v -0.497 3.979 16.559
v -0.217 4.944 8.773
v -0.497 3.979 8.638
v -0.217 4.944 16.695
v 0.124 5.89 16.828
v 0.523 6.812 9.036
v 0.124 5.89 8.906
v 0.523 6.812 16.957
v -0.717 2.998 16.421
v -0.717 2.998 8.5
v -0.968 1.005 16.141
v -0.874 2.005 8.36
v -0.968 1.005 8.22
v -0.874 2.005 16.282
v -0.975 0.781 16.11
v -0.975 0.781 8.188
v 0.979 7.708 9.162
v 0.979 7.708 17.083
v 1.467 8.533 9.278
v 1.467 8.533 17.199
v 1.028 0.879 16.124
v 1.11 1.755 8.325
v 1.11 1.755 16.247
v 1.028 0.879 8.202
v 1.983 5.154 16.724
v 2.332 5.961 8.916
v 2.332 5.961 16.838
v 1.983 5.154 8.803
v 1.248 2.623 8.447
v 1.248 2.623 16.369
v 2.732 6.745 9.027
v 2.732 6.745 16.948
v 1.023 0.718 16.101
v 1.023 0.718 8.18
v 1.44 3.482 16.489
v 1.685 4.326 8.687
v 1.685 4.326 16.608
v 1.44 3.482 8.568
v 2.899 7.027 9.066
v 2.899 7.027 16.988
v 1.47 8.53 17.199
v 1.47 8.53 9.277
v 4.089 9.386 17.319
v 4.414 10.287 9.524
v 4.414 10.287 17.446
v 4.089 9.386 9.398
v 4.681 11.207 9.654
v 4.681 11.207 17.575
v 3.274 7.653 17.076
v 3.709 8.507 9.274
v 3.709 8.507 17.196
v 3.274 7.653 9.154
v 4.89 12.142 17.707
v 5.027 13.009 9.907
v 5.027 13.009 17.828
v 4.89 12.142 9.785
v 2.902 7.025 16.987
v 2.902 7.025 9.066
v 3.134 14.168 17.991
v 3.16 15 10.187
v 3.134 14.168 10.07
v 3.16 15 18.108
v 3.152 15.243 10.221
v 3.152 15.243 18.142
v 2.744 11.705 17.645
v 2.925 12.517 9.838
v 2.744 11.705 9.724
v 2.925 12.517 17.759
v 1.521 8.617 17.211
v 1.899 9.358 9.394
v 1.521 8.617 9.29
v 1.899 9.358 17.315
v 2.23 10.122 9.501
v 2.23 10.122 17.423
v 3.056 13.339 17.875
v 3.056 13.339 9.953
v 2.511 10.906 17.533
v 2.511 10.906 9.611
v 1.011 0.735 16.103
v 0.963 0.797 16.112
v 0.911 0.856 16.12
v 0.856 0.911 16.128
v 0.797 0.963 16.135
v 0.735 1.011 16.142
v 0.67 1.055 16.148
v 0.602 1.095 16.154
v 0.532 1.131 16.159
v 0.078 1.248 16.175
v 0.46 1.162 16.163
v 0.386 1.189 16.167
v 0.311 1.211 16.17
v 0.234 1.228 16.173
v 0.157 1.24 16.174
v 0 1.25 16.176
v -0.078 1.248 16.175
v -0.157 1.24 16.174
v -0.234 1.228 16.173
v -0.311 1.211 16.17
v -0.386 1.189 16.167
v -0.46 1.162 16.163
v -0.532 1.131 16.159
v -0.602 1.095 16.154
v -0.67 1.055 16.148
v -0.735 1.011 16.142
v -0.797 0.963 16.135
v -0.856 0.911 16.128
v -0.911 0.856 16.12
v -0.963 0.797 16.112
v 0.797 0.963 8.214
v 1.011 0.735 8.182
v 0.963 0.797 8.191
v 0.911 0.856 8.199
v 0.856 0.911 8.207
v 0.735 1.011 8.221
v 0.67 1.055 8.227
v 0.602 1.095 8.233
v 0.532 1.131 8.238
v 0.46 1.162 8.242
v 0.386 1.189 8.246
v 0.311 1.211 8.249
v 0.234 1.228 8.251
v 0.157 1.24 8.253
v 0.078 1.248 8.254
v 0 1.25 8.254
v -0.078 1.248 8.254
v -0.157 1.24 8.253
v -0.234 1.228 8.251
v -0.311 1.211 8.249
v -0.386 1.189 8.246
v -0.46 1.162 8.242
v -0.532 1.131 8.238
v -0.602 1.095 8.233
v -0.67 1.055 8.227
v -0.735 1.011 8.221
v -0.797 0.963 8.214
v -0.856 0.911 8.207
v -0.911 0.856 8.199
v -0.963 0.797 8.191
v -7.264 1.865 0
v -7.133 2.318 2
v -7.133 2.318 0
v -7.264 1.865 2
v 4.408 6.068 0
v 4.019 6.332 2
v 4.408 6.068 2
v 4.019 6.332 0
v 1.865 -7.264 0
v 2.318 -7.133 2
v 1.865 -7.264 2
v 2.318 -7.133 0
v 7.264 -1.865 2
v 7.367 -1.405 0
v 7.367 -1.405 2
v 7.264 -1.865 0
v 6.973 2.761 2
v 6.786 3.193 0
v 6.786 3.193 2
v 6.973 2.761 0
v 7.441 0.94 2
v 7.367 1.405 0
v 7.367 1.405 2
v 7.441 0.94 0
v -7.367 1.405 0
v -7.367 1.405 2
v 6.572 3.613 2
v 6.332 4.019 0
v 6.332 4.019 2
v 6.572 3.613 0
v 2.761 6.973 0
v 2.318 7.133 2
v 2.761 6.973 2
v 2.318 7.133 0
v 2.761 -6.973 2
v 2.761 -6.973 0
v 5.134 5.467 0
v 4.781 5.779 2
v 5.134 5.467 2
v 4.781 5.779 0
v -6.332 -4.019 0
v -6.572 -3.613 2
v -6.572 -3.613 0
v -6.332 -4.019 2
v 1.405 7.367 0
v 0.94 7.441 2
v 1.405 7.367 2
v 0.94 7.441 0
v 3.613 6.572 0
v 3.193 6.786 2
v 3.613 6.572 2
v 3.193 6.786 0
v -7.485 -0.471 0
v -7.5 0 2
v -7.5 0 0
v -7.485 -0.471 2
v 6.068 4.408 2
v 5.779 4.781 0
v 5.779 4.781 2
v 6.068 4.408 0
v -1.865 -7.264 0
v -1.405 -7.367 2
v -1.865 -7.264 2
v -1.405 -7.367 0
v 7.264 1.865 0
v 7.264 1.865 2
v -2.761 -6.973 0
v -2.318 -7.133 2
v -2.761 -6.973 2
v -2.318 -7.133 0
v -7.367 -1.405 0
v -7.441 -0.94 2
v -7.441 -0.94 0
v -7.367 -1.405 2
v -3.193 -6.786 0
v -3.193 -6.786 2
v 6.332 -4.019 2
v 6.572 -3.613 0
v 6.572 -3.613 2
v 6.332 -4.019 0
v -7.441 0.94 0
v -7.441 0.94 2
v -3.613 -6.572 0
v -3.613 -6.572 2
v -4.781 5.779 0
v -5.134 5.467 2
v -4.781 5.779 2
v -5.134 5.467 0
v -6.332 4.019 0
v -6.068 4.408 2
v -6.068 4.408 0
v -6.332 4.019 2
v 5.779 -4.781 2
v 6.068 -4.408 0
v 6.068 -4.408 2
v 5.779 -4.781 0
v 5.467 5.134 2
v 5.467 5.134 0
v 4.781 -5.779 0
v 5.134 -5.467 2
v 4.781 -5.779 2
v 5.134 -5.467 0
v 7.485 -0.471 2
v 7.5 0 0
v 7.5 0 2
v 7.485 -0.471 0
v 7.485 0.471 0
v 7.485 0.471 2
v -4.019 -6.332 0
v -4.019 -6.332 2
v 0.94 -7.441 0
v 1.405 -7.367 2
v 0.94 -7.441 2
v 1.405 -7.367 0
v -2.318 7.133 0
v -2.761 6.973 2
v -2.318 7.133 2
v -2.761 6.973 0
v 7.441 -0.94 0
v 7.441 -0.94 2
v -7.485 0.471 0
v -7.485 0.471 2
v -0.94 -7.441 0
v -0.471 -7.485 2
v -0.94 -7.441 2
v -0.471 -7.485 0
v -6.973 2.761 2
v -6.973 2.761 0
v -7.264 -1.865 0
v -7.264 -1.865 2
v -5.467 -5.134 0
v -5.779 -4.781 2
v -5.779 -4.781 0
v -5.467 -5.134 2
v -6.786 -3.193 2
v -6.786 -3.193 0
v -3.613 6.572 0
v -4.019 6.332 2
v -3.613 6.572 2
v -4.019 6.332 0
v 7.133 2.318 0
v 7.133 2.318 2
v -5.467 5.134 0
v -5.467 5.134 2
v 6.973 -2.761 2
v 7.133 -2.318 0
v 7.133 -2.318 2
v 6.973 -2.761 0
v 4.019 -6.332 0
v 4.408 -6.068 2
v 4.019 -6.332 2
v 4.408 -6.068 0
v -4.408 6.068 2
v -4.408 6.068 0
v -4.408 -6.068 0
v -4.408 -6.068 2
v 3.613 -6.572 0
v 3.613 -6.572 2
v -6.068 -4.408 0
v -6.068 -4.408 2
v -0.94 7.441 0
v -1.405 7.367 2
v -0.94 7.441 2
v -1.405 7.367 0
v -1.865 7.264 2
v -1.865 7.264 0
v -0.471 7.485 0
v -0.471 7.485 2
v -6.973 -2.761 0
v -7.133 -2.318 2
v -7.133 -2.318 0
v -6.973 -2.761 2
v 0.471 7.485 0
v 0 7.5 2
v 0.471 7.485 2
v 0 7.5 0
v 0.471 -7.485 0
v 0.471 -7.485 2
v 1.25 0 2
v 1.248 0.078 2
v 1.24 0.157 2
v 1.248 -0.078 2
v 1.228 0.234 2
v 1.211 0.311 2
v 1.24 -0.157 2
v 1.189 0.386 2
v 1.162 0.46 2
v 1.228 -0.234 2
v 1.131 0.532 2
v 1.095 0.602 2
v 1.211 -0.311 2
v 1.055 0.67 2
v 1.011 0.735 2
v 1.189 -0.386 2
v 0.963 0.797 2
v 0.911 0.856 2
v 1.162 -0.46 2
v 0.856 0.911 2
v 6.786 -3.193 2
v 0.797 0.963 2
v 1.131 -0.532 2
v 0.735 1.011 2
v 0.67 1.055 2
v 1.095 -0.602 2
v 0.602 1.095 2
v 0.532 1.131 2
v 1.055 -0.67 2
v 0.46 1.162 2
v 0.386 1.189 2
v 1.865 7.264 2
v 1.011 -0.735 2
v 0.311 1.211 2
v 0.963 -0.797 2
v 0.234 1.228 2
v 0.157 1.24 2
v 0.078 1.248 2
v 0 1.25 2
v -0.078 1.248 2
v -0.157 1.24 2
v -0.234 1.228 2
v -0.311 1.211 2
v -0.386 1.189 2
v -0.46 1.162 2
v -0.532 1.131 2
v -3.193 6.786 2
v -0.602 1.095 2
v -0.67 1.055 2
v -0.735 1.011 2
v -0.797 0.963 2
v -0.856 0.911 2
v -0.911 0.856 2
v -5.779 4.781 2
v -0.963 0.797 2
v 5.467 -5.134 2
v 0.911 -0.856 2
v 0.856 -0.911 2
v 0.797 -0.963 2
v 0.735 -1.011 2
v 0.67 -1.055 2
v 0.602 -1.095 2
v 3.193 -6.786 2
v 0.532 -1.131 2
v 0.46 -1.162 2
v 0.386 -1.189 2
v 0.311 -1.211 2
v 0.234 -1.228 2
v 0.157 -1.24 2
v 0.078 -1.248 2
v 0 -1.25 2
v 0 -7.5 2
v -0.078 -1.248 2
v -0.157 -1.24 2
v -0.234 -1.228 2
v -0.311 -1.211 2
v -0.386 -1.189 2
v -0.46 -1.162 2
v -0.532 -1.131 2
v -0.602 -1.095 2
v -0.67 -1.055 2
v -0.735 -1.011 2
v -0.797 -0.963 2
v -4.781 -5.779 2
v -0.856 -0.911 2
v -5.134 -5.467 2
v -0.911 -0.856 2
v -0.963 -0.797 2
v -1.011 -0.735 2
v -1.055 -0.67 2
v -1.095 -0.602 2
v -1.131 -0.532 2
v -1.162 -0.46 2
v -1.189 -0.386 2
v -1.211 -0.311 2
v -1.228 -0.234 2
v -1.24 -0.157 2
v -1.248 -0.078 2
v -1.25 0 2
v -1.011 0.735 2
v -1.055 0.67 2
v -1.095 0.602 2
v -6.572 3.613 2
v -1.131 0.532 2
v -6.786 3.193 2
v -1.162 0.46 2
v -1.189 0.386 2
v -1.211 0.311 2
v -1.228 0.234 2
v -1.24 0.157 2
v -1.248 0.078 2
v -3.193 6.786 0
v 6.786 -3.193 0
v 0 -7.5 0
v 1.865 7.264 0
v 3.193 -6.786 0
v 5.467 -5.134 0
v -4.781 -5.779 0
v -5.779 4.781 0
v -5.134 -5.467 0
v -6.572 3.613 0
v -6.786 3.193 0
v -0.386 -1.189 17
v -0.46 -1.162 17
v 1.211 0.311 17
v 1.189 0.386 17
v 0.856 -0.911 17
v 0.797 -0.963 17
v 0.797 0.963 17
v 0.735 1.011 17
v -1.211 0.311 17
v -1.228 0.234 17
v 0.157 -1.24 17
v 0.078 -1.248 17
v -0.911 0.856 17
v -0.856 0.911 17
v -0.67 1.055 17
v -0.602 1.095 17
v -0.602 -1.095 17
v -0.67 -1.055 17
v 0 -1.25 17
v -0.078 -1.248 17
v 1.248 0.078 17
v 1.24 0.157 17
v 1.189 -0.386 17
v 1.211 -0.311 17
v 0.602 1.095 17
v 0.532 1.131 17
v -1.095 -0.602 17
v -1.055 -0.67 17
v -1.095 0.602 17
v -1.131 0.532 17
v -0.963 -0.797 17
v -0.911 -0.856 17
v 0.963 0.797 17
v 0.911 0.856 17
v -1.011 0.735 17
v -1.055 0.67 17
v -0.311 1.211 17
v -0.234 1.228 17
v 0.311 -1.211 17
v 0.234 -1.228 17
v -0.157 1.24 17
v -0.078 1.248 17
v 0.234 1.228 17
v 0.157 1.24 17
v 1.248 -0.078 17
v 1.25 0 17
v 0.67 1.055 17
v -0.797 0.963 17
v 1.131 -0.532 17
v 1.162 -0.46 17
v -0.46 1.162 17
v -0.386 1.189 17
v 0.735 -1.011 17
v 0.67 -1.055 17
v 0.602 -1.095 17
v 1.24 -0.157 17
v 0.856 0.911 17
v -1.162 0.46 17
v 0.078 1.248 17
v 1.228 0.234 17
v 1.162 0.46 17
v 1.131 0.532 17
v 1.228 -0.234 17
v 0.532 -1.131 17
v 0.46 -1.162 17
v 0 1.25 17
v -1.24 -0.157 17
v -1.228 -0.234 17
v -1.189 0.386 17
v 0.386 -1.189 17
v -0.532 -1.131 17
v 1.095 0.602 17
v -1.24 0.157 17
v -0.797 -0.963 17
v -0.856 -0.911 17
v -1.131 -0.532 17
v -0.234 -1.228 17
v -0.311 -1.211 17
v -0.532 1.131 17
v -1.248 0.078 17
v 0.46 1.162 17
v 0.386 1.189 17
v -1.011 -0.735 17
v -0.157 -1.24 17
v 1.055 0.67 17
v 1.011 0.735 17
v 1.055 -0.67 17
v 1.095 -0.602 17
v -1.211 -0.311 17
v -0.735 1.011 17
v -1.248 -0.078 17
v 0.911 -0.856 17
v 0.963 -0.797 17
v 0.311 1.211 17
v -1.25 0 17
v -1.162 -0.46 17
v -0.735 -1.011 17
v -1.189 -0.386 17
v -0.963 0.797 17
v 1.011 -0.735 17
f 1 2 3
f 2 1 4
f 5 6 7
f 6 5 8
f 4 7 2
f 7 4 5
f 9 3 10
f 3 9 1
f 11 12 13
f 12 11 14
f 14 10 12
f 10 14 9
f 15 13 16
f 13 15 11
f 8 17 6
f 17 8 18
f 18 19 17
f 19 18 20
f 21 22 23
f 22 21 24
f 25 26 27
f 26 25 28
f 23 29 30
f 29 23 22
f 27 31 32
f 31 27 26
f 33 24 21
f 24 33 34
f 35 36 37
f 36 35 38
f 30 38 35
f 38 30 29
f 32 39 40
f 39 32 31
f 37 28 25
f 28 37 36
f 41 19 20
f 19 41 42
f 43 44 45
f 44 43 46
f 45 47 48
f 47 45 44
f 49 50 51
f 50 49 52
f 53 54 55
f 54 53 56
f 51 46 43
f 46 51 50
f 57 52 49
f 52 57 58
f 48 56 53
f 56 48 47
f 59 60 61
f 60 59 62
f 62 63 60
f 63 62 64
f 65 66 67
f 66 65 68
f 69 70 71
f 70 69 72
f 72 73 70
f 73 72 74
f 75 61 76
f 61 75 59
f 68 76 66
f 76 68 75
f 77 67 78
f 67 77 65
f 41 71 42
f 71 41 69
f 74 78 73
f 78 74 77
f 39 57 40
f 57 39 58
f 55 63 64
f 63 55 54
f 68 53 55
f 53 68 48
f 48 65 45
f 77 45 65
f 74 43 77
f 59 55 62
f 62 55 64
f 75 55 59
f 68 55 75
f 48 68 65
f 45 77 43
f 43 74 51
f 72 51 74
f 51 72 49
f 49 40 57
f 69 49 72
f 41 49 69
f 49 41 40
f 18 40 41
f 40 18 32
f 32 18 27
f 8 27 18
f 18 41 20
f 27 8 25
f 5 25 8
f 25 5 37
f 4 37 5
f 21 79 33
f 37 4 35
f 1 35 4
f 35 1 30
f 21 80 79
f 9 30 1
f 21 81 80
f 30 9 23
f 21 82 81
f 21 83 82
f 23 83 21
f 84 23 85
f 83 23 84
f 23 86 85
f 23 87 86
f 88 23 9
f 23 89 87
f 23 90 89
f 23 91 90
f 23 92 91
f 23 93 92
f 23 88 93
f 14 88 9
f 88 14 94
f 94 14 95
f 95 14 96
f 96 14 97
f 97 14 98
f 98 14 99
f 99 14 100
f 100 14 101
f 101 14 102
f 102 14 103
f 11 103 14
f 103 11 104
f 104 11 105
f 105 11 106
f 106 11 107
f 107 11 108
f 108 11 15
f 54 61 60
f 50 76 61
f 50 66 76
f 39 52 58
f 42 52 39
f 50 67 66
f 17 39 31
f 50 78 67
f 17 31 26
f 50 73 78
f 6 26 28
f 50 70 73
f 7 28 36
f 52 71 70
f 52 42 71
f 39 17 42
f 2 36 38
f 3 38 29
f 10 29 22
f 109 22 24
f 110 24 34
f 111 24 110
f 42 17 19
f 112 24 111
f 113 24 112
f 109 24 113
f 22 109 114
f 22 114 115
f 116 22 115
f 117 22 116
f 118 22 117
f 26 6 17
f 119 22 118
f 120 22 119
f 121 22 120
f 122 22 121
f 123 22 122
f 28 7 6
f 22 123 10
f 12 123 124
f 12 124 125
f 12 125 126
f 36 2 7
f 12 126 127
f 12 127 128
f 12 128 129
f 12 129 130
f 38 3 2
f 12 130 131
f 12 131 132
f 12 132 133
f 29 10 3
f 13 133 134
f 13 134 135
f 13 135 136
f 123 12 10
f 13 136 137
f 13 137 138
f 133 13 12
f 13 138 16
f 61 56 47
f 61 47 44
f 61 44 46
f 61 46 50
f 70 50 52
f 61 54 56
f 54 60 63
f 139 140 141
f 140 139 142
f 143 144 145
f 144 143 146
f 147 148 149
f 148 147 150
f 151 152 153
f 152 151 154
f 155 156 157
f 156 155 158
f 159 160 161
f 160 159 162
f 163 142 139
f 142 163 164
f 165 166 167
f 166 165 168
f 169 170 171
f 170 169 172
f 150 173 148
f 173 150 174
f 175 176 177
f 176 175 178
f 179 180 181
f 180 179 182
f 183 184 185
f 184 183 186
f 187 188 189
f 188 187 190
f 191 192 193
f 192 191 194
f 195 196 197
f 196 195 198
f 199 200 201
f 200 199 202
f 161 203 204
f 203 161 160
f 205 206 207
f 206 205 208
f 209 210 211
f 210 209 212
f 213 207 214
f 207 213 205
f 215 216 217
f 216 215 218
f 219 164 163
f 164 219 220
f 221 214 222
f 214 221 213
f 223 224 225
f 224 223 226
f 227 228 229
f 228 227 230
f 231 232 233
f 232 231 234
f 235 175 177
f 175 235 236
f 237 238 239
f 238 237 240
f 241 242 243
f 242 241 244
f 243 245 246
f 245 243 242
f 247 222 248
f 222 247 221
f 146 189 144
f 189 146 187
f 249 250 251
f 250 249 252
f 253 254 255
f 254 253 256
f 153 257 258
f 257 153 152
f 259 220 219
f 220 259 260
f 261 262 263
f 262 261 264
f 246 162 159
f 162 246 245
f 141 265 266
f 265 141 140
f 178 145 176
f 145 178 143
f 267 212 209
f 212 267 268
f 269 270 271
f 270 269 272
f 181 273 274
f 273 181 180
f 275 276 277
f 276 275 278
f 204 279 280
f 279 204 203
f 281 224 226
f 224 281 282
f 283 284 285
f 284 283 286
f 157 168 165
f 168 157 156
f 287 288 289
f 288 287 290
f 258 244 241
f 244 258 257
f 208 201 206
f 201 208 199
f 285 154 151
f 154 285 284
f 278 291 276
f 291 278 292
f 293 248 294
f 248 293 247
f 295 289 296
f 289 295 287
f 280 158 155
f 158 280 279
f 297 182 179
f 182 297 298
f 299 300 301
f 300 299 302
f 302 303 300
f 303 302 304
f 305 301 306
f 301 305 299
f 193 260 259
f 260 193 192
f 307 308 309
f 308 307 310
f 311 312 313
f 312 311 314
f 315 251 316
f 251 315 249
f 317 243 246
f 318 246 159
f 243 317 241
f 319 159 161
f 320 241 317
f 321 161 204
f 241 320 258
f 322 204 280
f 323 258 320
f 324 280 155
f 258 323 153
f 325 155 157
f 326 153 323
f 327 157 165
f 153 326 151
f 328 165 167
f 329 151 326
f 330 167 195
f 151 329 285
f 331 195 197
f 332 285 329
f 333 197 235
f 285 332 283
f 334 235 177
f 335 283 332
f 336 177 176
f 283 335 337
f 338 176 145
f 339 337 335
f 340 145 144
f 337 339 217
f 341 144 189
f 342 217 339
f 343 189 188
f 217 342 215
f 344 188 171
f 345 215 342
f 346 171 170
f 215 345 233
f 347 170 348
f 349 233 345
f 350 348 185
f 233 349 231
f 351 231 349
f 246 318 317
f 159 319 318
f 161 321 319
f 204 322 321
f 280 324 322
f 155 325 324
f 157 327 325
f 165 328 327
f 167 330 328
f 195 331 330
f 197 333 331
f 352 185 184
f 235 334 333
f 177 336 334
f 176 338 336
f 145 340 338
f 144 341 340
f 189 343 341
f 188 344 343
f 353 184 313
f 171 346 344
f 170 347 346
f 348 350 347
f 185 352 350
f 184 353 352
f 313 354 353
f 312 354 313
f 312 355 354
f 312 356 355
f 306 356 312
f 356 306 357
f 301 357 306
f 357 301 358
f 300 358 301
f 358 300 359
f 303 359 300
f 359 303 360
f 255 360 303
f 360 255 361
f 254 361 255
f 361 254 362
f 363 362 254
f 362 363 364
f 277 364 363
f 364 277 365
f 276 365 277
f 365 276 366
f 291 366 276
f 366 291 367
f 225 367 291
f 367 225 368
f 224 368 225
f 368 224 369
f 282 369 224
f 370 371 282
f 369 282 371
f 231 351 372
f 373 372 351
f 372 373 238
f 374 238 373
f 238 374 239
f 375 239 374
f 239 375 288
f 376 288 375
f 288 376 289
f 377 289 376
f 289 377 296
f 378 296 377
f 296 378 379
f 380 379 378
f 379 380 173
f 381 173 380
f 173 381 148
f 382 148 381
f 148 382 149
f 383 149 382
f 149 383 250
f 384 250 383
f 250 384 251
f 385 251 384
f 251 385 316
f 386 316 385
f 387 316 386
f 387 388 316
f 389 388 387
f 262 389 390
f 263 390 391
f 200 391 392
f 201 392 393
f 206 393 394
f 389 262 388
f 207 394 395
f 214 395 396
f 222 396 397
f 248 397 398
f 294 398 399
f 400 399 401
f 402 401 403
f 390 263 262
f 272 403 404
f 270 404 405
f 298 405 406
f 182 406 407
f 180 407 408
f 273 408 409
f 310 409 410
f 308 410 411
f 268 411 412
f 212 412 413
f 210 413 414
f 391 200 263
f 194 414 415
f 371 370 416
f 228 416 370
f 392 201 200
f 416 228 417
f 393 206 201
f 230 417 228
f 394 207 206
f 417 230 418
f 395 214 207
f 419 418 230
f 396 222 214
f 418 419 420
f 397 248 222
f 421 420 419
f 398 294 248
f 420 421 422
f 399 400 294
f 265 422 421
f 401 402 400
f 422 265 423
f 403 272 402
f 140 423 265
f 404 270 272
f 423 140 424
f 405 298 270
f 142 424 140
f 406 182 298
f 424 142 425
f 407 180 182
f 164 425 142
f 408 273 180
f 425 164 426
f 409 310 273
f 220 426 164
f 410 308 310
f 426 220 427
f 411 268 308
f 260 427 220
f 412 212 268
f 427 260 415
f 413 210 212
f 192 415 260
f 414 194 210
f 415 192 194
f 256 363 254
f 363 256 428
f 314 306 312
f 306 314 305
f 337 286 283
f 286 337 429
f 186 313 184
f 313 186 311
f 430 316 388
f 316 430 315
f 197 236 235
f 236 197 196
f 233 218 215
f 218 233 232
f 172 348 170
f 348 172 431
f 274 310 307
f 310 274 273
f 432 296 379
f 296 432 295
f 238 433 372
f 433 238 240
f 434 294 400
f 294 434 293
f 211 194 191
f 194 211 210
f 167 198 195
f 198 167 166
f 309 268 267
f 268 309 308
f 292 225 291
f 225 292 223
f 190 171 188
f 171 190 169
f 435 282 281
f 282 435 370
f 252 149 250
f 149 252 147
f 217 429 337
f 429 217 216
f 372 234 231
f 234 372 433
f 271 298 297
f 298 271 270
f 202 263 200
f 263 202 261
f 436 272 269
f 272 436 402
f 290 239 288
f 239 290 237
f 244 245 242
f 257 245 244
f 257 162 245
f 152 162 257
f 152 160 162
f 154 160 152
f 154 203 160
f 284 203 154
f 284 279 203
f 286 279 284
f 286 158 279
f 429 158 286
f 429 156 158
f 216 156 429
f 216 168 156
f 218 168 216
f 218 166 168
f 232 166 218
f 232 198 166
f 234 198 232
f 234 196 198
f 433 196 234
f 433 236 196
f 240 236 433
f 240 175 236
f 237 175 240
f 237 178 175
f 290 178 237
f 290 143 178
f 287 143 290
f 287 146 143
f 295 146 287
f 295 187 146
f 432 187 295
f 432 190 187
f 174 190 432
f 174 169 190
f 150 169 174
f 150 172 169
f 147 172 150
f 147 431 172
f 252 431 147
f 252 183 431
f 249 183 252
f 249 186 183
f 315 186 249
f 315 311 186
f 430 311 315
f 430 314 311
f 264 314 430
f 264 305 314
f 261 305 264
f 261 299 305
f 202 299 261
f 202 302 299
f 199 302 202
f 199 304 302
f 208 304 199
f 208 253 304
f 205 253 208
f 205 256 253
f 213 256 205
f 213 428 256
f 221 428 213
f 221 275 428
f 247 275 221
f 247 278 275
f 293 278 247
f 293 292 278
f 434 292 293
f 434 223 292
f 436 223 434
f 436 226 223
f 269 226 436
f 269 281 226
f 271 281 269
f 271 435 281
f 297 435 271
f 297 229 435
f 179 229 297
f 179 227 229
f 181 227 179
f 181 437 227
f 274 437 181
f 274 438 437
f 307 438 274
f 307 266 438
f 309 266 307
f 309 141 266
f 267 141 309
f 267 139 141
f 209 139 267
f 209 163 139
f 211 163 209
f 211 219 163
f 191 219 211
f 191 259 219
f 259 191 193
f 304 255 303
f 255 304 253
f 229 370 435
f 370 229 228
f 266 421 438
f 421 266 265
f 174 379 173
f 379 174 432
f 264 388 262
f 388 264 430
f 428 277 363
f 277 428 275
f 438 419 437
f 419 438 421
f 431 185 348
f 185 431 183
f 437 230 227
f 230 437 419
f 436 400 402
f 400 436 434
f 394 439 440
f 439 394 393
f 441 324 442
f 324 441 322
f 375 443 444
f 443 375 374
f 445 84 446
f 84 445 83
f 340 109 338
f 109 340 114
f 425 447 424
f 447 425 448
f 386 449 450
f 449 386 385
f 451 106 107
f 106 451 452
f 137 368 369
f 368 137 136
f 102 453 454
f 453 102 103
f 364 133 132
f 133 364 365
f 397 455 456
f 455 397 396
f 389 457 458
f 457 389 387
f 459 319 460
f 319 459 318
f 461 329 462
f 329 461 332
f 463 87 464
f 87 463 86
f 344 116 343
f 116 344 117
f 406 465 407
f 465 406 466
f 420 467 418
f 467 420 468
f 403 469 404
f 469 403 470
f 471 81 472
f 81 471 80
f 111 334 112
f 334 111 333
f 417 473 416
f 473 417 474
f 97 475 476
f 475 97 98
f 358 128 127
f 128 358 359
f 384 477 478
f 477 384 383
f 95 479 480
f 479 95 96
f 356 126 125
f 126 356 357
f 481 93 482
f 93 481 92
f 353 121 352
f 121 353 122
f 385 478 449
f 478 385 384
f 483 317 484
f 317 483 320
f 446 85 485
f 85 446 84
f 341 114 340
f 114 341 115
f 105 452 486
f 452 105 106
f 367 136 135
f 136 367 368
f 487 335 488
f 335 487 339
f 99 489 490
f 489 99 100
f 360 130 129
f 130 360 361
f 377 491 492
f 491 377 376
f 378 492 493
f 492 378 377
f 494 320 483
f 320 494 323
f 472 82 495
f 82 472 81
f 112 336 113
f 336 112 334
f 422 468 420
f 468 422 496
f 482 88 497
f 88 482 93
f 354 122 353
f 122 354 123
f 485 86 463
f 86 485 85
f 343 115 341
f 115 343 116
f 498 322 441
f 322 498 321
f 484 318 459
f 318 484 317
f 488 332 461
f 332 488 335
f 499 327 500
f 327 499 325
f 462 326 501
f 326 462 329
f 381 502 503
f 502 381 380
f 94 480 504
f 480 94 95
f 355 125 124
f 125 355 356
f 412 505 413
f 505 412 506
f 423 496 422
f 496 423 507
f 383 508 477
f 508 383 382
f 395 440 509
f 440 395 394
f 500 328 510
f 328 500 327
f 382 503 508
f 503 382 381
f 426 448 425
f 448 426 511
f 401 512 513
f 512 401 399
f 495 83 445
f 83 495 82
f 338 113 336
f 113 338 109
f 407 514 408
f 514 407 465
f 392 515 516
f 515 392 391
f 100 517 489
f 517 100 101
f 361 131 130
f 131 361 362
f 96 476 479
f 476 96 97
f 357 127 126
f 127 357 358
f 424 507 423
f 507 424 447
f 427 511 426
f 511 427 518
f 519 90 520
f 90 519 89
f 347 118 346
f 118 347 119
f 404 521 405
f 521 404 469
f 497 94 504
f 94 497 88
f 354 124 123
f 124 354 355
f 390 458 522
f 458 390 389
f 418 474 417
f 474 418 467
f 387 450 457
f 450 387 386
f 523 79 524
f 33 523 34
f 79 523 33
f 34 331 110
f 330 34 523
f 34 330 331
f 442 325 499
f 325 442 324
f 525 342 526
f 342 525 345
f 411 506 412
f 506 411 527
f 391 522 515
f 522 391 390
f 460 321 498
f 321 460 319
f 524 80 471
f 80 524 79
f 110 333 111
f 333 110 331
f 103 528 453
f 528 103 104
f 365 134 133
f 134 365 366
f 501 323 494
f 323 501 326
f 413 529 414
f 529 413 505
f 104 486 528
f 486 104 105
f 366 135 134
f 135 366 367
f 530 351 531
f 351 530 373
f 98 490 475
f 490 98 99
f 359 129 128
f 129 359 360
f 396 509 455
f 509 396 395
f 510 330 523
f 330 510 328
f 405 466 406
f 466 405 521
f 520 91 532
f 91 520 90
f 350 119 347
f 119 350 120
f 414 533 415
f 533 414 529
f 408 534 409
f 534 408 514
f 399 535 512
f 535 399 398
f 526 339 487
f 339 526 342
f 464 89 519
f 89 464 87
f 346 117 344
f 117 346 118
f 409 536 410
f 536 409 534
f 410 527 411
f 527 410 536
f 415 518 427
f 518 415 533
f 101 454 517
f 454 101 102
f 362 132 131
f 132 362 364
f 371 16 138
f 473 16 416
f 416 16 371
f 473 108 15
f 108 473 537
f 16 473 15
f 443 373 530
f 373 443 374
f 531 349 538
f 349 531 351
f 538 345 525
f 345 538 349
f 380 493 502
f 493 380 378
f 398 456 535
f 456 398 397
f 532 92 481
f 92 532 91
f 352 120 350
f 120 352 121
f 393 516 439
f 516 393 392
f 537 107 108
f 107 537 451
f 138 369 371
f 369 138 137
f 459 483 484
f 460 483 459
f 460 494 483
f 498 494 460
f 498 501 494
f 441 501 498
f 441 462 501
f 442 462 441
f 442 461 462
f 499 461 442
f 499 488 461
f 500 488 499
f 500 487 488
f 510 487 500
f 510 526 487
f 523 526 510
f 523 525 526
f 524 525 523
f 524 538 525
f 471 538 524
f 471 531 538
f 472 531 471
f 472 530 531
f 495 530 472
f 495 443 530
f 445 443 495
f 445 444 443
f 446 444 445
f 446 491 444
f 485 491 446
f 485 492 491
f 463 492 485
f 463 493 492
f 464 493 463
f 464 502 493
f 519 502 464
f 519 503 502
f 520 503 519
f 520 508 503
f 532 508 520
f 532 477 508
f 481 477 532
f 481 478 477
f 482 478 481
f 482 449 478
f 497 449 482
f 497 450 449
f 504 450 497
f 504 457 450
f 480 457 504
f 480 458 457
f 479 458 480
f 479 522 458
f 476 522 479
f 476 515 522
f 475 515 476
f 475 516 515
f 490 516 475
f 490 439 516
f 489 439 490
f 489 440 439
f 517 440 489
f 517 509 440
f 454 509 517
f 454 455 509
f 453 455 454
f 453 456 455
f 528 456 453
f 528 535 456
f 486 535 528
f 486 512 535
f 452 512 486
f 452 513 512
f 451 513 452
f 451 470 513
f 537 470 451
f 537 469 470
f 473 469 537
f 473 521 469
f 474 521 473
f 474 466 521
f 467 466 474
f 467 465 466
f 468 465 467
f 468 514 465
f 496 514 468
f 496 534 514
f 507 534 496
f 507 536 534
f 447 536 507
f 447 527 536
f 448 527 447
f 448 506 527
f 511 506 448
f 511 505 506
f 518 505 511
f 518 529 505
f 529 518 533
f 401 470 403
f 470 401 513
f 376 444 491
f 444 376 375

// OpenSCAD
/*
Flag model by Curial Orrit - 2018
All rights reserved
*/

$INCLINA = 8;

cylinder(h=2, r=7.5, $fn=100);
cylinder(h=17, r=1.25, $fn=100);

difference() {
    union() {
        // primer aro
        difference() {
            translate([15,0,8])
            cylinder(h=16, r=16.0, $fn=100);
            translate([15,0,6])
            cylinder(h=20, r=14.0, $fn=100);
            
            translate([-5,-30,0])
            cube([50,30,30]);
            
            translate([-5,15,0])
            rotate([0,0,-45])
            cube([50,30,30]);
        }

        // segon aro
        difference() {
            translate([-10.09,15,8])
            cylinder(h=16, r=15.25, $fn=100);

            translate([-10.09,15,6])
            cylinder(h=20, r=13.25, $fn=100);
            
            translate([-45,12.5,0])
            rotate([0,0,-45])
            cube([60,30,30]);
            
            translate([0,19,0])
            rotate([0,0,-50])
            cube([50,30,30]);
            
            translate([-25,19,0])
            cube([50,30,30]);
        }
    } // end union
    translate([-10,0,16])
    rotate([$INCLINA,0,0])
    cube([20,20,10]);

    translate([-10,0,0])
    rotate([$INCLINA,0,0])
    cube([20,20,8]);
} // end difference
